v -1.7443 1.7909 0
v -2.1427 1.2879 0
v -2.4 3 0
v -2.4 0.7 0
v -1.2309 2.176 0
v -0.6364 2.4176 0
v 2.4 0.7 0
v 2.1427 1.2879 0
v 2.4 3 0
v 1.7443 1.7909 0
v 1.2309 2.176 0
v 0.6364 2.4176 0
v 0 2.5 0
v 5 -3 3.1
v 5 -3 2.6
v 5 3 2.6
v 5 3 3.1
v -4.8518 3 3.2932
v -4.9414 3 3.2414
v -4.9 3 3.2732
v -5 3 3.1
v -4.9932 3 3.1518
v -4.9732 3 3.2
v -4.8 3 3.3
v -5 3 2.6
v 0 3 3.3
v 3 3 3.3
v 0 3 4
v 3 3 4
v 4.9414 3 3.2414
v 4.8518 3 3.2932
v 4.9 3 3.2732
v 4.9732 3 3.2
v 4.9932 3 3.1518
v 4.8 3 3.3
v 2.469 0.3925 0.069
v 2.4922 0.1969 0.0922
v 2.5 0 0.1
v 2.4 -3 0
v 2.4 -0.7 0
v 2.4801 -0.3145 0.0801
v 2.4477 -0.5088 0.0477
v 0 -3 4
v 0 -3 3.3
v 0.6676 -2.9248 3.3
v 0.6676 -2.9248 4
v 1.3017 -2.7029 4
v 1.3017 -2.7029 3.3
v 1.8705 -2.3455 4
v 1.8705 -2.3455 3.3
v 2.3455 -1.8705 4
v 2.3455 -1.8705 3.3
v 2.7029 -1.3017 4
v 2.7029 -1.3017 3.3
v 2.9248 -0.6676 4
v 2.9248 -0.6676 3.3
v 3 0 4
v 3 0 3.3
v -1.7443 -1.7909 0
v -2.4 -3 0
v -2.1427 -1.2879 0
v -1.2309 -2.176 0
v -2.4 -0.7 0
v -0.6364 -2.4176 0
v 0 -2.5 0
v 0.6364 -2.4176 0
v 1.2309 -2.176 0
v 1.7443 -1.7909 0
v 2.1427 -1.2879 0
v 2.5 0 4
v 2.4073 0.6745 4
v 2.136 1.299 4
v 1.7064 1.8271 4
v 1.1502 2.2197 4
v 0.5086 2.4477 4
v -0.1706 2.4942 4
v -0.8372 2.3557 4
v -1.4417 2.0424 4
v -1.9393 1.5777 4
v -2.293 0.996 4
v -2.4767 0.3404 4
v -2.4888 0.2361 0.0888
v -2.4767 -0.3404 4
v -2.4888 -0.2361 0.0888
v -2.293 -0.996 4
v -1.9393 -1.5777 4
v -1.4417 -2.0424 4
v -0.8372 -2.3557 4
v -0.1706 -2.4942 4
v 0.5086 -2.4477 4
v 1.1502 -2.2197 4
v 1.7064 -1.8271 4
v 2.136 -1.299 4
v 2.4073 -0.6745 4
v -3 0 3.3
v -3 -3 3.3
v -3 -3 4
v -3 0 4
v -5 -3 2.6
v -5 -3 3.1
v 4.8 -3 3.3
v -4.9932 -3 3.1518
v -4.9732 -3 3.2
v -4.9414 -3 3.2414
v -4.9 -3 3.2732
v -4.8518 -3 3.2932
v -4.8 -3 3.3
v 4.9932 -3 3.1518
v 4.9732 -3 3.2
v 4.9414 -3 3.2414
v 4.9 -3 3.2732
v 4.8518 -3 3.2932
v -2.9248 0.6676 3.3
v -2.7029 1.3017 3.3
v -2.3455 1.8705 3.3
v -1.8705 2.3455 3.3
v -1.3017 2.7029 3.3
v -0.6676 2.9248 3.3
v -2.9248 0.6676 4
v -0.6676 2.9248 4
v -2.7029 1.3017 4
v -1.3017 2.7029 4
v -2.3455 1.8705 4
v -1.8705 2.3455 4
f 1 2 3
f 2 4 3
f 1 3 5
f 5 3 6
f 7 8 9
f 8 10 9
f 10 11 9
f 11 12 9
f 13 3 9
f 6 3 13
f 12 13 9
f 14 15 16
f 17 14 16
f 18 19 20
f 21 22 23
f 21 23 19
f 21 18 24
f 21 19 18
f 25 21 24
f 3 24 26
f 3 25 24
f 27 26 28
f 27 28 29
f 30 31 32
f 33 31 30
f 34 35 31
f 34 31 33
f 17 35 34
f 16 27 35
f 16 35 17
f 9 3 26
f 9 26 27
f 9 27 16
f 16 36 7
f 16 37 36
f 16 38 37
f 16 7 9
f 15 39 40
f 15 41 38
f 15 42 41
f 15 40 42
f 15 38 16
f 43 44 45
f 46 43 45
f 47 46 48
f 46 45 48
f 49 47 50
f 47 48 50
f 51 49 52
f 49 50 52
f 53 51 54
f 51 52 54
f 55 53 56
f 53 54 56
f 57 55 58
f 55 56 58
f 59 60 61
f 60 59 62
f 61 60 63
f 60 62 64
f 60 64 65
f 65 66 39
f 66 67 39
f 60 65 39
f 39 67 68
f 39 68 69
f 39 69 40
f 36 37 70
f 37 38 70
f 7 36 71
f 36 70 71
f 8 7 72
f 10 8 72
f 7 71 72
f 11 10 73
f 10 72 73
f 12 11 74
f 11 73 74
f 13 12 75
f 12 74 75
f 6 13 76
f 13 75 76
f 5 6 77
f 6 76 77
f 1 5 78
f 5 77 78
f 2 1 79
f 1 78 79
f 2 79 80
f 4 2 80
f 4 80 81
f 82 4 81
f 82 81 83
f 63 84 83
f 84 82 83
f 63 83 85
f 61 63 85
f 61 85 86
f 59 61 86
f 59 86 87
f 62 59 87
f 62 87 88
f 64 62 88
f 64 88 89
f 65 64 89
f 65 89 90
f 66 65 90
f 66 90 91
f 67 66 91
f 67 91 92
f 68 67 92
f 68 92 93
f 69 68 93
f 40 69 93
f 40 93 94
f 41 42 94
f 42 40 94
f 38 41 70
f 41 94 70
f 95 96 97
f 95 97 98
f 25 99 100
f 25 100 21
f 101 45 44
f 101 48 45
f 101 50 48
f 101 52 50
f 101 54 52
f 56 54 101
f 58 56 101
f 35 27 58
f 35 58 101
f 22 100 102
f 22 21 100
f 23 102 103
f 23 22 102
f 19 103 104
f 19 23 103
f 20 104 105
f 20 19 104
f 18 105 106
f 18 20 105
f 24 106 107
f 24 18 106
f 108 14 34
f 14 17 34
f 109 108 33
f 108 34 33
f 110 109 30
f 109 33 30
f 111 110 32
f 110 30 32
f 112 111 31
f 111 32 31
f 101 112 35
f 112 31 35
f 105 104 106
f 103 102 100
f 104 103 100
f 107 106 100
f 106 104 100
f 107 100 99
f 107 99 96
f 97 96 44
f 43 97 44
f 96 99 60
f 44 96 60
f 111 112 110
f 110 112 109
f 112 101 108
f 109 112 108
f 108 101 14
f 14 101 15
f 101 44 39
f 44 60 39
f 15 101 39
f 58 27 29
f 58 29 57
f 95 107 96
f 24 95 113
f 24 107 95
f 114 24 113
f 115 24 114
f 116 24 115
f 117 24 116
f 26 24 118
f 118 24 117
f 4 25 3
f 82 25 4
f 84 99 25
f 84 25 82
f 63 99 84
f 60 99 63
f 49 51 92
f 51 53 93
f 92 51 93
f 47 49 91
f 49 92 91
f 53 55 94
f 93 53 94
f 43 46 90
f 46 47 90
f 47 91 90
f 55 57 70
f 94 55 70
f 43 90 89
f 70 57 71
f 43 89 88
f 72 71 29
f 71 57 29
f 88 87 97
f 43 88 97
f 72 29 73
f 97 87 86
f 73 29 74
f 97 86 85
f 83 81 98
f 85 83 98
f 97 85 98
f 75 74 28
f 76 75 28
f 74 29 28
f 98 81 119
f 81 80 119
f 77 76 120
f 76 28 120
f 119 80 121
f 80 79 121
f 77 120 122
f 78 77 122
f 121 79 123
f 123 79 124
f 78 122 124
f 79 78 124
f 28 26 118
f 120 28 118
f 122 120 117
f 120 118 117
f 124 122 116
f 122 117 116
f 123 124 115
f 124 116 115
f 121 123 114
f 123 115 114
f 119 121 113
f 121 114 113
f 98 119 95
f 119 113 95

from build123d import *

# Parameters (mm, degrees)
SKETCH_W        = 10
SKETCH_H        = 6
PAD_DEPTH       = 3.3
PAD001_DEPTH    = 0.7
SKETCH002_R     = 2.5
POCKET_DEPTH    = 5
POCKET001_DEPTH = 6
FILLET_R        = 0.2


with BuildPart() as part:
    # Sketch → Pad (new body)
    with BuildSketch(Plane.XY):
        Rectangle(SKETCH_W, SKETCH_H)
    extrude(amount=PAD_DEPTH)

    # Sketch001 (on Face6 of Pad) → Pad001 (join)
    with BuildSketch(Plane.XY.offset(3.3)):
        with BuildLine():
            Line((0, 3), (3, 3))
            Line((3, 3), (3, 0))
            ThreePointArc((0, -3), (2.12132, -2.12132), (3, 0))
            Line((0, -3), (-3, -3))
            Line((-3, -3), (-3, -2e-06))
            ThreePointArc((0, 3), (-2.121321, 2.12132), (-3, -2e-06))
        make_face()
    extrude(amount=PAD001_DEPTH)

    # Sketch002 (on Face12 of Pad001) → Pocket (cut)
    with BuildSketch(Plane.XY.offset(4)):
        Circle(SKETCH002_R)
    extrude(amount=-POCKET_DEPTH, mode=Mode.SUBTRACT)

    # Sketch003 (on Face8 of Pocket) → Pocket001 (cut)
    with BuildSketch(Plane.XZ.offset(3)):
        Polygon((-2.4, 0), (2.4, 0), (5, 2.6), (7.104516, 2.6), (7.104516, -2.6), (-7.104516, -2.6), (-7.104516, 2.6), (-5, 2.6), align=None)
    extrude(amount=-POCKET001_DEPTH, mode=Mode.SUBTRACT)

    # Fillet
    fillet_edges = [part.edges().sort_by_distance(p)[0] for p in [
        (-5, 0, 3.3),
        (5, 0, 3.3),
    ]]
    fillet(fillet_edges, radius=FILLET_R)


solid = part.part
